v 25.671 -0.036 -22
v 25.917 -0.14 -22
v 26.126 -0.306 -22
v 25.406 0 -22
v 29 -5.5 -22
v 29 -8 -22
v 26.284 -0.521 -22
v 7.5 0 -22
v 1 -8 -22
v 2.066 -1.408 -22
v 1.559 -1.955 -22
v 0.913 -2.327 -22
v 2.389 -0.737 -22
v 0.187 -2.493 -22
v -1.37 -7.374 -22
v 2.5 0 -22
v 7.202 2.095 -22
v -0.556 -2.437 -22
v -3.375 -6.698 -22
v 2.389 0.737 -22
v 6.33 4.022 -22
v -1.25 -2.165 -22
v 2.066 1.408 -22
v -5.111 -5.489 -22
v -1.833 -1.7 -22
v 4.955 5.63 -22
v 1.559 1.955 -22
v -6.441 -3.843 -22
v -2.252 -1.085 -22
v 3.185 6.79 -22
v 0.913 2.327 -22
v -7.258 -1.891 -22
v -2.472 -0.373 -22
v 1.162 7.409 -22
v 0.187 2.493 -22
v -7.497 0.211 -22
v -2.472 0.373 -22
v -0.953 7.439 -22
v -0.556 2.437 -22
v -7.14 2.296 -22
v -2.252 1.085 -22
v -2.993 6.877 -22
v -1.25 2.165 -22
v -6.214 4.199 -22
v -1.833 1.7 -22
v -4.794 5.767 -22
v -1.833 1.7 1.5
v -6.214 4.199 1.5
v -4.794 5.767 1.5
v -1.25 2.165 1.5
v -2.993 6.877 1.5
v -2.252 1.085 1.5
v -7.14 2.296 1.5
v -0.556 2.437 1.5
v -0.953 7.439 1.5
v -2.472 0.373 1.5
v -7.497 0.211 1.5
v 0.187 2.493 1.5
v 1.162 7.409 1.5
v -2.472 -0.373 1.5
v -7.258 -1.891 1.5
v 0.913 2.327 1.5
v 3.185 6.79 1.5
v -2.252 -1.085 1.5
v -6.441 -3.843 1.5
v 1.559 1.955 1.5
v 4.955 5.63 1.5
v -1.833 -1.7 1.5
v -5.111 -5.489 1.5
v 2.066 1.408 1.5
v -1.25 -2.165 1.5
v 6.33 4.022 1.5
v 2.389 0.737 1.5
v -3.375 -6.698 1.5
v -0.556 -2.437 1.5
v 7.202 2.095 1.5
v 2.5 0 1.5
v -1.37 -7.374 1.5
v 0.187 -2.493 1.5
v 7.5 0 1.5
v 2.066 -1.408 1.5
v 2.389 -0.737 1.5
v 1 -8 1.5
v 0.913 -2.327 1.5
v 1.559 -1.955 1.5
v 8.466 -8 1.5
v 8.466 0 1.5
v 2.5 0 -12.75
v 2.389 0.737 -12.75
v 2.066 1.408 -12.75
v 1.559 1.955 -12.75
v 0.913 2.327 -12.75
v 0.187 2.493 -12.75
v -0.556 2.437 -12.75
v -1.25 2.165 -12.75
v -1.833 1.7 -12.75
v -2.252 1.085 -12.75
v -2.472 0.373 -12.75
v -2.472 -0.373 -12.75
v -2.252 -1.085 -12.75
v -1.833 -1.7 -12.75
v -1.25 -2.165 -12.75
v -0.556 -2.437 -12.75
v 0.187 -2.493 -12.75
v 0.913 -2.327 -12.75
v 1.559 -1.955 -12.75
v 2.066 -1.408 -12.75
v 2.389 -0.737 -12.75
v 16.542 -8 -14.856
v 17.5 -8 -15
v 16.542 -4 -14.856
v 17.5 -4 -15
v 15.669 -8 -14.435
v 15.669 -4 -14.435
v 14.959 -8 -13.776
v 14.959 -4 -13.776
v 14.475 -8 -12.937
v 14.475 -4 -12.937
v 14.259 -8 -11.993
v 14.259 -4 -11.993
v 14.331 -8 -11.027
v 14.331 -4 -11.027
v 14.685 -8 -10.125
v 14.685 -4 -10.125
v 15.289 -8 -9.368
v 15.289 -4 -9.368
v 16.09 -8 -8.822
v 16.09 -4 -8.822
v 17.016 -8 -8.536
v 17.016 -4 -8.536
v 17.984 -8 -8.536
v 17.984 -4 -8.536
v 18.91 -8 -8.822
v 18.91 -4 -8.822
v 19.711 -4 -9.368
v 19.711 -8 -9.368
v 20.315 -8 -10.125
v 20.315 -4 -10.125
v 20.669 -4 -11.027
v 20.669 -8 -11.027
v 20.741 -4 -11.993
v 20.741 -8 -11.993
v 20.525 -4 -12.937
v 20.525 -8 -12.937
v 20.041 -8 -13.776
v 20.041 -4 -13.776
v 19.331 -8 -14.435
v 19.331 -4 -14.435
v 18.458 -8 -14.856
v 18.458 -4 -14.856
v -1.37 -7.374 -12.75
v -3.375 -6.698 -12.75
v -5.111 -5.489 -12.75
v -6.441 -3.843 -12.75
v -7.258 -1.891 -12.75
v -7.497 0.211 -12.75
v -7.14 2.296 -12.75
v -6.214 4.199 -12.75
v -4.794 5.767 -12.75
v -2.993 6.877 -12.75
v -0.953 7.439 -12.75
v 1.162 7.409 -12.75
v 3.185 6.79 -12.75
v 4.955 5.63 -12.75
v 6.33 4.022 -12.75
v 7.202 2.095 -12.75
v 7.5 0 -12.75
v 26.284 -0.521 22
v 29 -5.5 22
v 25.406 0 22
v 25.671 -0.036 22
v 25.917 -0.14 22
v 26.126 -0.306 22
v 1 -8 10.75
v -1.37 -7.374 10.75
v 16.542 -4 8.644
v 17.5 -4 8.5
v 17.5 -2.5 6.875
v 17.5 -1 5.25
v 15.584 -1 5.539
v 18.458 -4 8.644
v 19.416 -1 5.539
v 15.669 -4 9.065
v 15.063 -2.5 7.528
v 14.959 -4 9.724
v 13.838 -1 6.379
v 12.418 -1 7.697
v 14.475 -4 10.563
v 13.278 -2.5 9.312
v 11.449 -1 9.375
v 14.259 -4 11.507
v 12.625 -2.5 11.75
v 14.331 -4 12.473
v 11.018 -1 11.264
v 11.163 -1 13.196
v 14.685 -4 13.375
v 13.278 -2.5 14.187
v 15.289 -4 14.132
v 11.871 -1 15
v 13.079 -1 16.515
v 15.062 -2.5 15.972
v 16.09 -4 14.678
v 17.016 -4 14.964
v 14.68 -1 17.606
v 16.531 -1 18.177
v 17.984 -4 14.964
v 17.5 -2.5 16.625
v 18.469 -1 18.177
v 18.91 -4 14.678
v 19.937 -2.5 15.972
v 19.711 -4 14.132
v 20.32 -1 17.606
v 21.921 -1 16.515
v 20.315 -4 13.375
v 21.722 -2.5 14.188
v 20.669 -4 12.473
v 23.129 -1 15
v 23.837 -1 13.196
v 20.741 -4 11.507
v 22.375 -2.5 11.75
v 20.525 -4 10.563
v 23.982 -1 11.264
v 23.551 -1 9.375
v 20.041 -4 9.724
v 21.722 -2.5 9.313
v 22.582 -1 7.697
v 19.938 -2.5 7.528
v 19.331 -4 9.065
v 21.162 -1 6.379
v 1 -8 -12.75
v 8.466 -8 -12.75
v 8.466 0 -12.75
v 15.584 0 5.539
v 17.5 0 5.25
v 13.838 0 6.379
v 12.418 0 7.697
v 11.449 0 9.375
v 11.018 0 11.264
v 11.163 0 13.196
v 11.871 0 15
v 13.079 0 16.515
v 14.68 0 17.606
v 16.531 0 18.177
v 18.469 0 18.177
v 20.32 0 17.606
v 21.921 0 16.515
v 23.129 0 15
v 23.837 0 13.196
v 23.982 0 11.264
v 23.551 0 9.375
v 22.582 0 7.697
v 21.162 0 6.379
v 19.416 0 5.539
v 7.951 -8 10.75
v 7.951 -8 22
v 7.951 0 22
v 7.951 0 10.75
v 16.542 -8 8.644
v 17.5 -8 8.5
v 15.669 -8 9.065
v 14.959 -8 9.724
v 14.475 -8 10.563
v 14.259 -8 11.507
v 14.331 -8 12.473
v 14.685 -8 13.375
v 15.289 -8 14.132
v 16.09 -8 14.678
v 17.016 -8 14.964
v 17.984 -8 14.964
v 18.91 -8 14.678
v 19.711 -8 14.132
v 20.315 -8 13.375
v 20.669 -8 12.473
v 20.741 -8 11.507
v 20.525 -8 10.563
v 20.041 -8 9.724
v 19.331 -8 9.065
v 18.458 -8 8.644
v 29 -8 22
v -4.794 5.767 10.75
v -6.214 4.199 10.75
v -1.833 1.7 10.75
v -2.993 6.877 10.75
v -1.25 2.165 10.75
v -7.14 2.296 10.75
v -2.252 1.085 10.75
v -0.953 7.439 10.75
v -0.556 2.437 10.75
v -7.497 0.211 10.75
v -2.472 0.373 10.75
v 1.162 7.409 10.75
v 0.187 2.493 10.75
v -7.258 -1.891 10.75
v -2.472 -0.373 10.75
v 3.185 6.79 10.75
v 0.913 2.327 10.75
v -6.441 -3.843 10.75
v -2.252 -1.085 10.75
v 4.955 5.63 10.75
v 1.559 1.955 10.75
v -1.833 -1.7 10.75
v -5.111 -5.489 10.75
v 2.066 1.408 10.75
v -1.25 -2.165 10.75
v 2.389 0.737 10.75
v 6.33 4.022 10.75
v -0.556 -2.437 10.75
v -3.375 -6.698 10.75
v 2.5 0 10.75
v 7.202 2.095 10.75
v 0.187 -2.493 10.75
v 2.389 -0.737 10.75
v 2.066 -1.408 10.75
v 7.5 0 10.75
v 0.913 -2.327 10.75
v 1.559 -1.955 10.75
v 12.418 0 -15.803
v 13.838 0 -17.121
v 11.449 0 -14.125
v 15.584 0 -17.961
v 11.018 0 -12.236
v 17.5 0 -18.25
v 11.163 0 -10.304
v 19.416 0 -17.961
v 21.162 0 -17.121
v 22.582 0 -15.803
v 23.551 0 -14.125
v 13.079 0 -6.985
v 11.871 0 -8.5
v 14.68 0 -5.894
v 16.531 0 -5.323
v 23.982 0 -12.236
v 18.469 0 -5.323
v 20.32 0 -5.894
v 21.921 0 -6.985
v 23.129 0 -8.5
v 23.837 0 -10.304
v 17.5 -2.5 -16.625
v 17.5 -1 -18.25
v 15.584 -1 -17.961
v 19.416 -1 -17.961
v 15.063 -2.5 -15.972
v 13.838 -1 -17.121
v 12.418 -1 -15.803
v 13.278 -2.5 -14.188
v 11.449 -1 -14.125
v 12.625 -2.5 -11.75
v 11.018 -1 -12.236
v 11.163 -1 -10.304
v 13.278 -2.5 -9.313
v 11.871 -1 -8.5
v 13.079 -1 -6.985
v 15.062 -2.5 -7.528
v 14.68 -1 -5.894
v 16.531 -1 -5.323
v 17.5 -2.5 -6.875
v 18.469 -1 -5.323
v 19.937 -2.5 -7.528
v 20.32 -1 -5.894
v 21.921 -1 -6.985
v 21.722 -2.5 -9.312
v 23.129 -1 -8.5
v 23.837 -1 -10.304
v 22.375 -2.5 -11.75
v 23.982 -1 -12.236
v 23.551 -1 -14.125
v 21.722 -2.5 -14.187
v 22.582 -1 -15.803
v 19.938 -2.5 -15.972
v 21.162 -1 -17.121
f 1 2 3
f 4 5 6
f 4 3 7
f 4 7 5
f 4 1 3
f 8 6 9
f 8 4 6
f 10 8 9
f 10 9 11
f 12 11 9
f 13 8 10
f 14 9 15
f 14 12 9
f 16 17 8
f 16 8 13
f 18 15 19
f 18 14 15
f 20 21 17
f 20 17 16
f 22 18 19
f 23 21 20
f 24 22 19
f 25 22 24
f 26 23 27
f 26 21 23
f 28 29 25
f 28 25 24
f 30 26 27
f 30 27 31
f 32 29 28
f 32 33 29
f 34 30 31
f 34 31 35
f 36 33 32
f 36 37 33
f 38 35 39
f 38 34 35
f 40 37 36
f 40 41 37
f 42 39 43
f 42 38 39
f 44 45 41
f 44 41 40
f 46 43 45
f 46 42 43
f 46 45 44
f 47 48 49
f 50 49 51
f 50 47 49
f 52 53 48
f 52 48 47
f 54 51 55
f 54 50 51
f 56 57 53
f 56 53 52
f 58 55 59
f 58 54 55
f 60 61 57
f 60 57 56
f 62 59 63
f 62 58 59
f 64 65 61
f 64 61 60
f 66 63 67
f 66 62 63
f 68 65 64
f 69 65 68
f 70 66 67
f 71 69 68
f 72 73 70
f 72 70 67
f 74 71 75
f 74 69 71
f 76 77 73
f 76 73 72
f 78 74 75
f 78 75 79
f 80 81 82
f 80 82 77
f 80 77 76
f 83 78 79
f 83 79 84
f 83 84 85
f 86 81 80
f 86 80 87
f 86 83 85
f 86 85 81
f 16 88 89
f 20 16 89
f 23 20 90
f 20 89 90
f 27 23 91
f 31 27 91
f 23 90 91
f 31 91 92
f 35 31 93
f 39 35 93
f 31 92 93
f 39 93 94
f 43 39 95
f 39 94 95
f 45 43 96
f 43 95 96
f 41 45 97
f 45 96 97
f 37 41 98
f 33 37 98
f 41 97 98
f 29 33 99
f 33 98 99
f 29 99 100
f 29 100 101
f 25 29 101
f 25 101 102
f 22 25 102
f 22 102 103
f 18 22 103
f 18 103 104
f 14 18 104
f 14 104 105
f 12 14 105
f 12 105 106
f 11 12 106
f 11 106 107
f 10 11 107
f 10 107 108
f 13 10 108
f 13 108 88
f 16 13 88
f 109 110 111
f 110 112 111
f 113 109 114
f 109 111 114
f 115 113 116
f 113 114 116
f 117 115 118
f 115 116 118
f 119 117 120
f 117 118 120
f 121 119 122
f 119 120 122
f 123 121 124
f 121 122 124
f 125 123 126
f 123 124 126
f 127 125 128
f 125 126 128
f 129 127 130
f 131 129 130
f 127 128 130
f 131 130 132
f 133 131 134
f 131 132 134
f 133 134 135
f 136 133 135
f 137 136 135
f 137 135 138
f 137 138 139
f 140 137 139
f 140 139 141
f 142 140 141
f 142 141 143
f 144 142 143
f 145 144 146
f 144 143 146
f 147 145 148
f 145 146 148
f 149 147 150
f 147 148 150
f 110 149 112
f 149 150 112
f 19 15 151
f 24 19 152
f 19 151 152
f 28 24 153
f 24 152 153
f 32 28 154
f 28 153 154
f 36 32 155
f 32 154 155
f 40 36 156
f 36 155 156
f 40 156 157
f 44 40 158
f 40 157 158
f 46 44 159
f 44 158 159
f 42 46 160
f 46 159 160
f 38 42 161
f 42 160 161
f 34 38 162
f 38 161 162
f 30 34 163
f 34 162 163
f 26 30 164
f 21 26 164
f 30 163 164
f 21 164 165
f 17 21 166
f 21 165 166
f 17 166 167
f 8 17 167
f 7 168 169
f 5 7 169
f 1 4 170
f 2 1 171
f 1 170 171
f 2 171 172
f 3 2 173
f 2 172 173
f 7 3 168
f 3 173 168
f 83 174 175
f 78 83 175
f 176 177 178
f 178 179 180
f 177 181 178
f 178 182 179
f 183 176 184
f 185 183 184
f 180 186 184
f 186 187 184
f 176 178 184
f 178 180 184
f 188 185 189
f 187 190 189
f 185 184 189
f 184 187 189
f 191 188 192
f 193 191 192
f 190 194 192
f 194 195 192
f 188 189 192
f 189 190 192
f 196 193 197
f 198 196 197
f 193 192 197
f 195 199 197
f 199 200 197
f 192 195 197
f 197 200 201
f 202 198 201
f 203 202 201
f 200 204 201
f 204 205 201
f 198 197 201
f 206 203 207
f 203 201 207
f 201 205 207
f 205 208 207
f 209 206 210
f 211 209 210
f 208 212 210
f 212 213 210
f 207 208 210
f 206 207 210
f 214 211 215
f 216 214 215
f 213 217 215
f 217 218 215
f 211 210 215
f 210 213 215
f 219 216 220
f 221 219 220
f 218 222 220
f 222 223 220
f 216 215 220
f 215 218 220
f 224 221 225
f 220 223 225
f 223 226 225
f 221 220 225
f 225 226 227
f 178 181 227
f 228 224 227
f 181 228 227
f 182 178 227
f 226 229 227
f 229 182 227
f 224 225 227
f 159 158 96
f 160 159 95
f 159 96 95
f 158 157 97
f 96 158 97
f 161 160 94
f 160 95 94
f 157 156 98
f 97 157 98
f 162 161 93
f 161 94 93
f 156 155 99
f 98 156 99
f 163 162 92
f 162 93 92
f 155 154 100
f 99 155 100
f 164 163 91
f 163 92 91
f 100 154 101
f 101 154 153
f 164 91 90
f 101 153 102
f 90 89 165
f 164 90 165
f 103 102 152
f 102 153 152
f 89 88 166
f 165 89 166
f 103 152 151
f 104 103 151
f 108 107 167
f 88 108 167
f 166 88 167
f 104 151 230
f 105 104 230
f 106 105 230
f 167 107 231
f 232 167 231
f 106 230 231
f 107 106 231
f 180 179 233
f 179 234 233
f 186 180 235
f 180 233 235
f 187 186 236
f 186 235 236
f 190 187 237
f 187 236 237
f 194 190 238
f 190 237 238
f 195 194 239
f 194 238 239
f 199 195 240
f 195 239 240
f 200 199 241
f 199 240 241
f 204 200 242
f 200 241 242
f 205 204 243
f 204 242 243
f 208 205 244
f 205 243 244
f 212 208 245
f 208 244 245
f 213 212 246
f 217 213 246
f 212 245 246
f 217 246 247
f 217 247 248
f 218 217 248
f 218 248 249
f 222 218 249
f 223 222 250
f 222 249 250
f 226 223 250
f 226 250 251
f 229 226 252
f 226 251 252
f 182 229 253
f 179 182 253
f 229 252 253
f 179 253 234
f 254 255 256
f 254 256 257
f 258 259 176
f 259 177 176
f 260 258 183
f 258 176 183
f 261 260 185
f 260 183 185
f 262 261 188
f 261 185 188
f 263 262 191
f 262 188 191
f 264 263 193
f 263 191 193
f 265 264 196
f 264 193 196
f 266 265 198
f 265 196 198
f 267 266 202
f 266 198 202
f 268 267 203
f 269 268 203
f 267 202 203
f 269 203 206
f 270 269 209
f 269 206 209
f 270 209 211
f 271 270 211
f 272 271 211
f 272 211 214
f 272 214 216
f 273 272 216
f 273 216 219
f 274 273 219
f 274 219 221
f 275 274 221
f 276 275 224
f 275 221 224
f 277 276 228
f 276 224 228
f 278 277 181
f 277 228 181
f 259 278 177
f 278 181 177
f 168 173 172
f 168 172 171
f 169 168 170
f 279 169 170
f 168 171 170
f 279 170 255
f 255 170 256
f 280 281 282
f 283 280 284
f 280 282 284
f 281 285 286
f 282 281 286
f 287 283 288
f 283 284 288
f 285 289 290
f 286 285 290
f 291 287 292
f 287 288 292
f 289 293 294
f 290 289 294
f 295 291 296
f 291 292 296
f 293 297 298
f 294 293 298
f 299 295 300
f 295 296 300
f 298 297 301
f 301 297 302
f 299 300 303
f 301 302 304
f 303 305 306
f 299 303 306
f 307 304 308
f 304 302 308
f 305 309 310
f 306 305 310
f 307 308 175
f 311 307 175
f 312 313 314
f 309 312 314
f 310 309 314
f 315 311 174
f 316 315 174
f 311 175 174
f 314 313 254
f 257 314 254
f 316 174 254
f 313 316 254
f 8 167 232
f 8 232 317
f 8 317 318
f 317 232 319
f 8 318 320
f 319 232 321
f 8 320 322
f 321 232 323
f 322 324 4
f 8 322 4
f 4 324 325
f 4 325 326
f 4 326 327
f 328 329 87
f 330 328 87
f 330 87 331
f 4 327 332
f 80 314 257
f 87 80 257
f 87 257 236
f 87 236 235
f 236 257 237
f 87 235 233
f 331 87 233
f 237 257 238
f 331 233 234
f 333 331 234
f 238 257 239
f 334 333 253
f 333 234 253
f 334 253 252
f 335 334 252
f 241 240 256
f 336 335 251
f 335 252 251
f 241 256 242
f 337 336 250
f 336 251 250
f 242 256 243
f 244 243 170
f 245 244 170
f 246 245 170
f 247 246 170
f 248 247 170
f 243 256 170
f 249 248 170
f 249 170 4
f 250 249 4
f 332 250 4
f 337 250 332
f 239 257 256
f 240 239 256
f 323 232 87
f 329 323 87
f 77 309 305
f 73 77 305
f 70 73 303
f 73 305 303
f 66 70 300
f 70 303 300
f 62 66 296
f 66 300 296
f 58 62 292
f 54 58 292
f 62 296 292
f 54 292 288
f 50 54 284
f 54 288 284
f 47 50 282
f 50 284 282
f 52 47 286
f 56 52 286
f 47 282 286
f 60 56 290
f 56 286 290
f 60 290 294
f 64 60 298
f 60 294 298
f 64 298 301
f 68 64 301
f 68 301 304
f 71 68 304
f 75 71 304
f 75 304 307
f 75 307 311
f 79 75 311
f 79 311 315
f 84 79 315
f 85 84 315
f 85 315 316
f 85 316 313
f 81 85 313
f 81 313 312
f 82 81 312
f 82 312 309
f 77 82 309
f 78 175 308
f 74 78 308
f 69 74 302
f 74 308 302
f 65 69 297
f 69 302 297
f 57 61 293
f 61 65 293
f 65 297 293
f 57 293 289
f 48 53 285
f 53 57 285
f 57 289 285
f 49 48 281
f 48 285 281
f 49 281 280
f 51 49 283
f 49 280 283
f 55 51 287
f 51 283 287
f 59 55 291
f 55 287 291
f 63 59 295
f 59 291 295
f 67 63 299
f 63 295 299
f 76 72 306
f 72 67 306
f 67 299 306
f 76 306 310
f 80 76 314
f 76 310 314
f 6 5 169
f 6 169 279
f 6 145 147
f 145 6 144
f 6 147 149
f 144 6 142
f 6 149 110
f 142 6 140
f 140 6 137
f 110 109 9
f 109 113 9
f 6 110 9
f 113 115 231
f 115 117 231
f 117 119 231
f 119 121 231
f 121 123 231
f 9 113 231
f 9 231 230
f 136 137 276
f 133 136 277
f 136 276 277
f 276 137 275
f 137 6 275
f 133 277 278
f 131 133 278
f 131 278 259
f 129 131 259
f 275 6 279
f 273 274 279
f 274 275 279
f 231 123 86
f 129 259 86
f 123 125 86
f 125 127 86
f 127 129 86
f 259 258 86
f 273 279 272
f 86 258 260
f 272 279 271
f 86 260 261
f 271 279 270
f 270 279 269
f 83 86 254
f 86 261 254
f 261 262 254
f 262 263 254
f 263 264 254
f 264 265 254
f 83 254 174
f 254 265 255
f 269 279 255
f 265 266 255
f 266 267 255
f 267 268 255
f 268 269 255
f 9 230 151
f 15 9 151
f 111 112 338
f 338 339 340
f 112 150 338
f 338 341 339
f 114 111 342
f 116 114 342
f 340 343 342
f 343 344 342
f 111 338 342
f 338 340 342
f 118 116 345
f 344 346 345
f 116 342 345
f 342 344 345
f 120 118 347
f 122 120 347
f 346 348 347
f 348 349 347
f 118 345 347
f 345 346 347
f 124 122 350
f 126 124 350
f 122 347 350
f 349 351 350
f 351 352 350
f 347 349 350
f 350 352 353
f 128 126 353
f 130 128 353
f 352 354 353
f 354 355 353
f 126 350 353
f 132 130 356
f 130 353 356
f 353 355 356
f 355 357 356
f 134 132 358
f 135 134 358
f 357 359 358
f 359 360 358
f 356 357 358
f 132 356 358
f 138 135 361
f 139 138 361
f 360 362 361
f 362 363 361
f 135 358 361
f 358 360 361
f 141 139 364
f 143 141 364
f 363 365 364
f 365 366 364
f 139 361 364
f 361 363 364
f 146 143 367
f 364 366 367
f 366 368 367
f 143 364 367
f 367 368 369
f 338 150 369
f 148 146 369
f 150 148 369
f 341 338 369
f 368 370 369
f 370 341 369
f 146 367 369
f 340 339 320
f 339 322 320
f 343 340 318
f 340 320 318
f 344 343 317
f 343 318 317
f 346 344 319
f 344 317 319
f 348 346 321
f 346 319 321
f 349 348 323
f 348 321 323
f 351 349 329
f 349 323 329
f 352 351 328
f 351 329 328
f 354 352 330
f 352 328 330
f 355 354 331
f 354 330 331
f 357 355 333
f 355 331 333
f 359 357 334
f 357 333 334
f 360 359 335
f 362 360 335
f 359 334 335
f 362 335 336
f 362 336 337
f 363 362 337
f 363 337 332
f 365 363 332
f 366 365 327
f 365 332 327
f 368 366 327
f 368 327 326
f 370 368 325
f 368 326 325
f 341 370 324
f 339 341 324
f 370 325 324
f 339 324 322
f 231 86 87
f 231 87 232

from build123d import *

# Parameters (mm, degrees)
EXTRUDE_1_DEPTH          = 22
PATTERN_LINEAR_1_COUNT   = 2
PATTERN_LINEAR_1_PITCH   = 23.5
CUT_EXTRUDE_1_DEPTH      = 38.269290307
CUT_EXTRUDE_1_DEPTH_BACK = 38.269290307
SKETCH_4_W               = 15.894607506
SKETCH_4_H               = 11.25
SKETCH_4_W_2             = 16.409425433
SKETCH_4_H_2             = 14.25
SKETCH_5_R               = 2.5
CUT_EXTRUDE_2_DEPTH      = 45.469793118


with BuildPart() as part:
    # 草图1 → 凸台-拉伸1 (new, symmetric)
    with BuildSketch(Plane.XY):
        with BuildLine():
            Line((29, -5.5), (29, -8))
            Line((29, -8), (1, -8))
            Line((1, -8), (-1.370141735, -7.373785434))
            ThreePointArc((-1.370141735, -7.373785434), (-4.794472702, 5.767411162), (7.5, 0))
            Line((7.5, 0), (25.406366901, 0))
            ThreePointArc((25.406366901, 0), (25.916831332, -0.140101131), (26.284262474, -0.521147869))
            Line((26.284262474, -0.521147869), (29, -5.5))
        make_face()
    extrude(amount=EXTRUDE_1_DEPTH, both=True)

    # 草图3 → 切除-旋转1 (revolve, cut)
    with BuildSketch(Plane.XY.offset(11.75), mode=Mode.PRIVATE) as cut_revolve_1_sk:
        Polygon((24, 0), (17.5, 0), (17.5, -8), (20.75, -8), (20.75, -4), (24, -1), align=None)
    cut_revolve_1 = revolve(cut_revolve_1_sk.sketch.rotate(Axis((17.5, -8, 11.75), (0, 1, 0)), 90), axis=Axis((17.5, -8, 11.75), (0, 1, 0)), mode=Mode.SUBTRACT)

    # 阵列(线性)1: 切除-旋转1 ×2
    with Locations(*[(0, 0, -i * PATTERN_LINEAR_1_PITCH) for i in range(1, PATTERN_LINEAR_1_COUNT)]):
        add(cut_revolve_1, mode=Mode.SUBTRACT)

    # 草图4 → 切除-拉伸1 (cut, two sides: drawn at the far end of the back side and taken through both)
    with BuildSketch(Plane(origin=(0, 0, 0), x_dir=(1, 0, 0), z_dir=(0, 1, 0)).offset(-CUT_EXTRUDE_1_DEPTH_BACK)):
        with Locations((0.004095995, -16.375)):
            Rectangle(SKETCH_4_W, SKETCH_4_H)
        with Locations((0.261504959, 5.625)):
            Rectangle(SKETCH_4_W_2, SKETCH_4_H_2)
    extrude(amount=CUT_EXTRUDE_1_DEPTH + CUT_EXTRUDE_1_DEPTH_BACK, mode=Mode.SUBTRACT)

    # 草图5 → 切除-拉伸2 (cut, through all)
    with BuildSketch(Plane.XY.offset(10.75)):
        Circle(SKETCH_5_R)
    extrude(amount=-CUT_EXTRUDE_2_DEPTH, mode=Mode.SUBTRACT)


solid = part.part
